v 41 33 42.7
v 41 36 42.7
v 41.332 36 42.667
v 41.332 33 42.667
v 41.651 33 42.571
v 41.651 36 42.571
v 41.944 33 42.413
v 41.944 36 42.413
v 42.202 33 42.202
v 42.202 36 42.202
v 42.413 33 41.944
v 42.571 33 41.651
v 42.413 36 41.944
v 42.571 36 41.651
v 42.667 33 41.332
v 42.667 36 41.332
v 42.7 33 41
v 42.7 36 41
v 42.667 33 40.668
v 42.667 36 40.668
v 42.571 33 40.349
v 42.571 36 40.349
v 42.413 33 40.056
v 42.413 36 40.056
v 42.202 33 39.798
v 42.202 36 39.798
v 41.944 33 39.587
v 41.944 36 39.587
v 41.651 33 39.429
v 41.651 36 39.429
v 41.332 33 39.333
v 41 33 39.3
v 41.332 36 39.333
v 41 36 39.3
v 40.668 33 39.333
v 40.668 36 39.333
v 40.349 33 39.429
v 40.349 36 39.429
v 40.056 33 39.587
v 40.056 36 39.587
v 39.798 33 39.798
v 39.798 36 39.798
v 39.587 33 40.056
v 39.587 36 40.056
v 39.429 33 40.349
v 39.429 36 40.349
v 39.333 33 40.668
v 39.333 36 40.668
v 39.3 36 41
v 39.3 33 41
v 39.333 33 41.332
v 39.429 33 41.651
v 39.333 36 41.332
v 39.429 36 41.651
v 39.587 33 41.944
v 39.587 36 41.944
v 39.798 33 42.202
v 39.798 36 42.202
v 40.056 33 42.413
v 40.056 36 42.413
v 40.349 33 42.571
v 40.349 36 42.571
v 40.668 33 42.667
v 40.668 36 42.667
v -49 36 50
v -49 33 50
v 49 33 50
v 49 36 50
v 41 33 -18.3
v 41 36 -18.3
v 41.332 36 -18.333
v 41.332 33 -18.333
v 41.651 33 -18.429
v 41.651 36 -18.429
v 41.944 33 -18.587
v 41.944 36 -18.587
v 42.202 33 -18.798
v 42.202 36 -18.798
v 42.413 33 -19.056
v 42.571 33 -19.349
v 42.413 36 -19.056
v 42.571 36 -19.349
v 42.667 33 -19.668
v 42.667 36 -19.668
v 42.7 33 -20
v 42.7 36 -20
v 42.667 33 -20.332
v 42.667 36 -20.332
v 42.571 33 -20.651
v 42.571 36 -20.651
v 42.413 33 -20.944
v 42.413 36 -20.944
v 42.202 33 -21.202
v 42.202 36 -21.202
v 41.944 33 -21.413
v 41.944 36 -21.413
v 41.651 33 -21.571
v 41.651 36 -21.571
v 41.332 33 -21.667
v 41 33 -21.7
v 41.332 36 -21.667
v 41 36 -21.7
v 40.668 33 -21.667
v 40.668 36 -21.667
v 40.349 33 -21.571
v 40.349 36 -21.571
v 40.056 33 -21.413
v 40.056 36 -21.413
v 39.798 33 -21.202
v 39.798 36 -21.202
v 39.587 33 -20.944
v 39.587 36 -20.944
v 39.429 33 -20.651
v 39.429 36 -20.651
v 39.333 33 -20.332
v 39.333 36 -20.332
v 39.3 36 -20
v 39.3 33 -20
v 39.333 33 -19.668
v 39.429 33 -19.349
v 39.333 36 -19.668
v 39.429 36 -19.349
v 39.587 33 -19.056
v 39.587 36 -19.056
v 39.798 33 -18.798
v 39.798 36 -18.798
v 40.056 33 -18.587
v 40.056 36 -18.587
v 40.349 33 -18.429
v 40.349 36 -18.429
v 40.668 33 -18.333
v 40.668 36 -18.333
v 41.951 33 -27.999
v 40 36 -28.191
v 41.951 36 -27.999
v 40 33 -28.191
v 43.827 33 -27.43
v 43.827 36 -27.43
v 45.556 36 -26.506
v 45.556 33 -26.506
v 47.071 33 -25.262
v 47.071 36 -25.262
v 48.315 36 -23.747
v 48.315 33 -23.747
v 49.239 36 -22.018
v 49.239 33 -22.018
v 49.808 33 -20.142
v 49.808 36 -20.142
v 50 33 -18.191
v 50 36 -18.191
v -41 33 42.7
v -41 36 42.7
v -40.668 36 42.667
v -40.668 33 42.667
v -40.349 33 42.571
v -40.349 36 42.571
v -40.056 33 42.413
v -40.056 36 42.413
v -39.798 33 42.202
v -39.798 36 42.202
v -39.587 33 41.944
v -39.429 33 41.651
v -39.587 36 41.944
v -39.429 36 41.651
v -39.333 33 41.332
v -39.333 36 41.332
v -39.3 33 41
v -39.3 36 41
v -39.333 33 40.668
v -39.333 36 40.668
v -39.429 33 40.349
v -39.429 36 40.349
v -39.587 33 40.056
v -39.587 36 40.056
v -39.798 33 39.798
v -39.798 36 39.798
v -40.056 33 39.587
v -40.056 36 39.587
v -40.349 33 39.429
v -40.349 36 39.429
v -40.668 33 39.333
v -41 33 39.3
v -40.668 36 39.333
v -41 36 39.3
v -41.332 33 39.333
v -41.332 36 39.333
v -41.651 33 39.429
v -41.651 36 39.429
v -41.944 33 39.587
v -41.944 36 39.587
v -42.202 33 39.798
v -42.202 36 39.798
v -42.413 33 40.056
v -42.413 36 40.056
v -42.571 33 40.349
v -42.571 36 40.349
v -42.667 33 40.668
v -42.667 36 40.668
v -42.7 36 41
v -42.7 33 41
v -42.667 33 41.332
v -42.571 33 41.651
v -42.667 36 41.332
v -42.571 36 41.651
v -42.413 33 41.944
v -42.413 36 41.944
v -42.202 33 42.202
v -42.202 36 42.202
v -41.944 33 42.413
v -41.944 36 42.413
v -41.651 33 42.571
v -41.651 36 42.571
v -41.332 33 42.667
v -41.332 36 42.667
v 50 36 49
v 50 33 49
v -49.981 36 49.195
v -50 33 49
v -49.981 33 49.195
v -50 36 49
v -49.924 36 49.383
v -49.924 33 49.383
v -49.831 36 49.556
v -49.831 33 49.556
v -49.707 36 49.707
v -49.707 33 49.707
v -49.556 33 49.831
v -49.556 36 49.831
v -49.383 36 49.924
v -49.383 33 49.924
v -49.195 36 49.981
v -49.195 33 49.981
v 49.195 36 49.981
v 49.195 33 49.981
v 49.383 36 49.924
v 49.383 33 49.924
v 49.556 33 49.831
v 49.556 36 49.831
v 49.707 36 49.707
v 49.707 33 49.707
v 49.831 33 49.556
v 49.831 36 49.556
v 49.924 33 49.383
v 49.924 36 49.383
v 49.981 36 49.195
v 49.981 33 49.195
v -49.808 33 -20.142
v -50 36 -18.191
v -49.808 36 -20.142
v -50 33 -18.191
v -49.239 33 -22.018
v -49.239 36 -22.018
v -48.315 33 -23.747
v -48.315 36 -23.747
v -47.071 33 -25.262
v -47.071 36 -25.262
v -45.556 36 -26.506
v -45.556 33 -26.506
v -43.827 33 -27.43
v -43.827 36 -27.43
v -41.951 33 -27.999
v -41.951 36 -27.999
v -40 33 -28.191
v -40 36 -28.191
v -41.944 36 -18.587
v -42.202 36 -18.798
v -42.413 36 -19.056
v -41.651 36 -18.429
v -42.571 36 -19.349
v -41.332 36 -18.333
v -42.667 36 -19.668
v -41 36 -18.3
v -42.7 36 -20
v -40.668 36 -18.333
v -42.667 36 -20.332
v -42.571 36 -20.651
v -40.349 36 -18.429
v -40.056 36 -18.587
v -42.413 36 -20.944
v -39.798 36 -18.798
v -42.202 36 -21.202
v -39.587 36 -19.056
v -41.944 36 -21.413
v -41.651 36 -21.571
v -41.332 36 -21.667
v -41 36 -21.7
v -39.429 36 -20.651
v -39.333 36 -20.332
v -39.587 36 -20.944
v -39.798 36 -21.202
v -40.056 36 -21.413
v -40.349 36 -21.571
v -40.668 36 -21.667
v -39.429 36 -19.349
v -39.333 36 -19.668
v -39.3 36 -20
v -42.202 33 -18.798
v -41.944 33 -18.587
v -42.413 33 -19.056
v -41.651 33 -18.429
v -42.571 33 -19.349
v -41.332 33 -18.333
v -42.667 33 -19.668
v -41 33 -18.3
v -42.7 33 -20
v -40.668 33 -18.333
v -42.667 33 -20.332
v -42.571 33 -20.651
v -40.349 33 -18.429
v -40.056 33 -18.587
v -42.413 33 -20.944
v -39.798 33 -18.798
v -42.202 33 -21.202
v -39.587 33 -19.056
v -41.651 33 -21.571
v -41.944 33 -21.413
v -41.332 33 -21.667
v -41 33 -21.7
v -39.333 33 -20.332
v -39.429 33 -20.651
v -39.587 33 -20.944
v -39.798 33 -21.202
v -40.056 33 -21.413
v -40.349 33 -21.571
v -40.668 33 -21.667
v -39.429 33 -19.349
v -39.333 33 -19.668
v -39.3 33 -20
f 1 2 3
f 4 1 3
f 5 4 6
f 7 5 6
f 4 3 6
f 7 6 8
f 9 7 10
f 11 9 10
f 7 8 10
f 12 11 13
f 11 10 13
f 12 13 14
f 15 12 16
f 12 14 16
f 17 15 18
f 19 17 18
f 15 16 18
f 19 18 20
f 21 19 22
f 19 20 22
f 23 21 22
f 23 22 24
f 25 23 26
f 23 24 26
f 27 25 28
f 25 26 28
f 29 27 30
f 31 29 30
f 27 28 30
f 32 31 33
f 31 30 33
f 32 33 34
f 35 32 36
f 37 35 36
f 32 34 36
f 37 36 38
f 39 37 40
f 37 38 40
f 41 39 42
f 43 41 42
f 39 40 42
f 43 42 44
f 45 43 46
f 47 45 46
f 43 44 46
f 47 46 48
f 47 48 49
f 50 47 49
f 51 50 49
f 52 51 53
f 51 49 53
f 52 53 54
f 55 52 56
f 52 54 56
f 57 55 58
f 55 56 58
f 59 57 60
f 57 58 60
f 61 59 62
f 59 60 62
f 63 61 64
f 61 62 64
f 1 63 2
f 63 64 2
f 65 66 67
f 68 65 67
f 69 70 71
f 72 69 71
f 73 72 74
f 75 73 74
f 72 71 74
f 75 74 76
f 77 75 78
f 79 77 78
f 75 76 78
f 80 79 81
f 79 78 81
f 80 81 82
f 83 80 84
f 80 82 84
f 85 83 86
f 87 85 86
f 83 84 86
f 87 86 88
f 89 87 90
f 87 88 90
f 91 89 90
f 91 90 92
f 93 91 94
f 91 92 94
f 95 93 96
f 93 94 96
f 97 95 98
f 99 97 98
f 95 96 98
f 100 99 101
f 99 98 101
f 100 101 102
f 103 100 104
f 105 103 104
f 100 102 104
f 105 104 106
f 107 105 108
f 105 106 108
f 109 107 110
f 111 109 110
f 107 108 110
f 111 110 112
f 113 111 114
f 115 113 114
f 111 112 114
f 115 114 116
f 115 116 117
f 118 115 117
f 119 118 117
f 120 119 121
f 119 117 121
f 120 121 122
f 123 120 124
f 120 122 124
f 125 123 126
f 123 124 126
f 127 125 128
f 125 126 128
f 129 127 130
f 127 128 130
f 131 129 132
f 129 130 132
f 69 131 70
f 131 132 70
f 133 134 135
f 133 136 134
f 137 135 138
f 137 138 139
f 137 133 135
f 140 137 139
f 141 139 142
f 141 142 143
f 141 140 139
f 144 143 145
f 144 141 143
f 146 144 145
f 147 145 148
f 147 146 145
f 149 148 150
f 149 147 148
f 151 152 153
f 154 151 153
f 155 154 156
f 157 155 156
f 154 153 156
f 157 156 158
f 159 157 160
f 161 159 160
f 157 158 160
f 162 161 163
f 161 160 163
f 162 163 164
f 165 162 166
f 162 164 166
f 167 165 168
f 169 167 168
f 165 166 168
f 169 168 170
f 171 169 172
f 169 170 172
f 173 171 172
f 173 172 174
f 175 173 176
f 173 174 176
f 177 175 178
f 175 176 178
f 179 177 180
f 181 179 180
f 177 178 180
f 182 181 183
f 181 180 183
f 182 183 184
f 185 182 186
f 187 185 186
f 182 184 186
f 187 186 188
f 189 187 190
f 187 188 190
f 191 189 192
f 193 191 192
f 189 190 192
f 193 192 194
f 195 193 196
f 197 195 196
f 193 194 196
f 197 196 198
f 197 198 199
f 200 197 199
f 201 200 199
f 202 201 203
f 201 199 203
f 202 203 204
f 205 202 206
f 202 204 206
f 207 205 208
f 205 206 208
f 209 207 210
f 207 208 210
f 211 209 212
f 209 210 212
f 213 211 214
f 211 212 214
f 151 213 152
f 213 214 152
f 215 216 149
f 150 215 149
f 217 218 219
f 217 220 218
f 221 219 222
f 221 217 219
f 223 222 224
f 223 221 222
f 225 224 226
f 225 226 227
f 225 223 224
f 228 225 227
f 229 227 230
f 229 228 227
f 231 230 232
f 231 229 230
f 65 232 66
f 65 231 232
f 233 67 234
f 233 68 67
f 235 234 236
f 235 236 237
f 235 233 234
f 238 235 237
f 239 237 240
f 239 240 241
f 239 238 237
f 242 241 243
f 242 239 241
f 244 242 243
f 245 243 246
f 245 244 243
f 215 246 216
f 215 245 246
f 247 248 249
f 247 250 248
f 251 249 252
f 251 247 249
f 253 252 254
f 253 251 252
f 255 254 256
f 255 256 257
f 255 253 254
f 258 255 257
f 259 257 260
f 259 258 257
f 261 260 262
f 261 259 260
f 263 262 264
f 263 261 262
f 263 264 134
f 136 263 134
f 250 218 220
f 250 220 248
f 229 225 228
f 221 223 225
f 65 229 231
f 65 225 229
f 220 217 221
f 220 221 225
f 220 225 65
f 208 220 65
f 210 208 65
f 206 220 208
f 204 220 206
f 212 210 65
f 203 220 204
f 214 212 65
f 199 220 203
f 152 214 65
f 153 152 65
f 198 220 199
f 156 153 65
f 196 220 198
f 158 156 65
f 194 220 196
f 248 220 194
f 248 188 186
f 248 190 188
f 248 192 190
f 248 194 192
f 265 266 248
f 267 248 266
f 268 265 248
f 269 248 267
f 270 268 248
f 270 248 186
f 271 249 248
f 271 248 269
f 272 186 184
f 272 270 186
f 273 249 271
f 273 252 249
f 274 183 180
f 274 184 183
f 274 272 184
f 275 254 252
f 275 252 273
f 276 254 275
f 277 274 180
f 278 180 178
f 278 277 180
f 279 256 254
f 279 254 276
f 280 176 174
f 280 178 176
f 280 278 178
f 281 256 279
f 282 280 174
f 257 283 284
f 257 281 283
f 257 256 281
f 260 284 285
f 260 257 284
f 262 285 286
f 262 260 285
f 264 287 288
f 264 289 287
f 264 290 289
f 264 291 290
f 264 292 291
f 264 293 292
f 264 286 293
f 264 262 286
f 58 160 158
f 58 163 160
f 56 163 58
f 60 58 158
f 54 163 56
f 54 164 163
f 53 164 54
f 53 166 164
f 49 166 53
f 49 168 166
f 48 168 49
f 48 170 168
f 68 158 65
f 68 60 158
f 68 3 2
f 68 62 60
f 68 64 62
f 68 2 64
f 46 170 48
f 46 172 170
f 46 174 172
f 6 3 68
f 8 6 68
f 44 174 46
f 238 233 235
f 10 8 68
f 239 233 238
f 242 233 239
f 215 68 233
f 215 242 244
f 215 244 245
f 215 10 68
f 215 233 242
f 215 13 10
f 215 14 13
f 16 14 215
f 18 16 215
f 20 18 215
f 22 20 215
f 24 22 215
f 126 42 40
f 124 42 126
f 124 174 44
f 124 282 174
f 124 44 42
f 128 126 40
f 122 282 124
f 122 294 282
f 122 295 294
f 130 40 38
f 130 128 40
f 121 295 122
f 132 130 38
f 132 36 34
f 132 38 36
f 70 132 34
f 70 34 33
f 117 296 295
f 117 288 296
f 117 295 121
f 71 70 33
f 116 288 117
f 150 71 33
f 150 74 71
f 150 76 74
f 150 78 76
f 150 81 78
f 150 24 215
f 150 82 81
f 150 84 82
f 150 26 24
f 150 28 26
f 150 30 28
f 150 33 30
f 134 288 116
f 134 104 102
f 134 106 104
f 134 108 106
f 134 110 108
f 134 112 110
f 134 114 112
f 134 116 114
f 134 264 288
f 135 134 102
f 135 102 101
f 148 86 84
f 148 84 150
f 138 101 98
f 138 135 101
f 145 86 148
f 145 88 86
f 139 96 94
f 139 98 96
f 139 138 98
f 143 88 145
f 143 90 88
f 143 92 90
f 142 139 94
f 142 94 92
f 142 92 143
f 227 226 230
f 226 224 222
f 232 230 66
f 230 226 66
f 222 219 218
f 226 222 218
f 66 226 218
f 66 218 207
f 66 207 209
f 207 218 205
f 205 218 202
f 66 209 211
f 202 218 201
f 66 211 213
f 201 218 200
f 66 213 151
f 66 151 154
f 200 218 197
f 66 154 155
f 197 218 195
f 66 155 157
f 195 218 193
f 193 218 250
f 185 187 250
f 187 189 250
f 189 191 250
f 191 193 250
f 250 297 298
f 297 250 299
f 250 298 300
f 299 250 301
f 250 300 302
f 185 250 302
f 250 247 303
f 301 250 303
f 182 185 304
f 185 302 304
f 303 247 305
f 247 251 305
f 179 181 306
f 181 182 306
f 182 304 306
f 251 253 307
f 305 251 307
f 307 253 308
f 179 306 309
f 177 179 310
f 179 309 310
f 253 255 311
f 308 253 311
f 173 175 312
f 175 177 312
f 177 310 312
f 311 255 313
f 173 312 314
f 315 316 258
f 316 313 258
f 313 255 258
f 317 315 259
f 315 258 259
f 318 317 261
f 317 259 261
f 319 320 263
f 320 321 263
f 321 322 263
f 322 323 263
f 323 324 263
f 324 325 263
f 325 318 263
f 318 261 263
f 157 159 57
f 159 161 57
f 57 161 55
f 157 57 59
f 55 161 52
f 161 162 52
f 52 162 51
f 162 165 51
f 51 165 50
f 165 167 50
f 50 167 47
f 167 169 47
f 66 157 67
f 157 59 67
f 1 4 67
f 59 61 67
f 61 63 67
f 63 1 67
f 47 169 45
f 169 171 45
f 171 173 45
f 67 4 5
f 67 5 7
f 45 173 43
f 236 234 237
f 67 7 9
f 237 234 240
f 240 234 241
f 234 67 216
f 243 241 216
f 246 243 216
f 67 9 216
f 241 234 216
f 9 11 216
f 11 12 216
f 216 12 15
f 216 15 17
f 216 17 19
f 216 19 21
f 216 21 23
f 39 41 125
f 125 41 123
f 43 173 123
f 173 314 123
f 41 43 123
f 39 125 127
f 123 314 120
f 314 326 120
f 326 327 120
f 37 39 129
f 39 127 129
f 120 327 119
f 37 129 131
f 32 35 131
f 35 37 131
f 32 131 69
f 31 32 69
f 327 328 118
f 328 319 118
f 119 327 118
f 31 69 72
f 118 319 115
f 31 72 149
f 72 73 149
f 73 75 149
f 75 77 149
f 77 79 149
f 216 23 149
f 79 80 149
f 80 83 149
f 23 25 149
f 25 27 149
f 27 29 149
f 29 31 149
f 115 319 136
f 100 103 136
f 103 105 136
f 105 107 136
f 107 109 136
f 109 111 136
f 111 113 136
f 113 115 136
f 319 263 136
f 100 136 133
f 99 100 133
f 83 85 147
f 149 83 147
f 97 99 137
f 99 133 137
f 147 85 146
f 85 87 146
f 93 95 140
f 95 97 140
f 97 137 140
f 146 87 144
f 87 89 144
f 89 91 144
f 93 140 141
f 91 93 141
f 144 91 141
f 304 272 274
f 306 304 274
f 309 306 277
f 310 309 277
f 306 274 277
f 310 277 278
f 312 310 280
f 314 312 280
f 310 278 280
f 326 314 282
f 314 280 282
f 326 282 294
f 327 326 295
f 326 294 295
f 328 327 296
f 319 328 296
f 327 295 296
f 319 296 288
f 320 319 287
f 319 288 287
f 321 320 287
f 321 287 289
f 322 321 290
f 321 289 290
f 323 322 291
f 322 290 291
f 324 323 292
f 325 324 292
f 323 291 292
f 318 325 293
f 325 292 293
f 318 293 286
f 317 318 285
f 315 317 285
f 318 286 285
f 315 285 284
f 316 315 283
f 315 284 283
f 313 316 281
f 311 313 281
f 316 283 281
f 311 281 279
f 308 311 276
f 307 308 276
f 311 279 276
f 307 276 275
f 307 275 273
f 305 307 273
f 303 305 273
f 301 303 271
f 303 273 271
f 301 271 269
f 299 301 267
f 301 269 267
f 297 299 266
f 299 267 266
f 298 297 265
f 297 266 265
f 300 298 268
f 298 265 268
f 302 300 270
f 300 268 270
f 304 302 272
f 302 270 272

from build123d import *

# Parameters (mm, degrees)
SKETCH1_W           = 100
SKETCH1_H           = 100
BOSS_EXTRUDE1_DEPTH = 3
SKETCH2_R           = 1.7
CUT_EXTRUDE1_DEPTH  = 3
SKETCH6_W           = 100
SKETCH6_H           = 21.808924231
CUT_EXTRUDE2_DEPTH  = 3
FILLET2_R           = 10
FILLET3_R           = 1


with BuildPart() as part:
    # Sketch1 → Boss-Extrude1 (new body)
    with BuildSketch(Plane(origin=(0, 33, 0), x_dir=(1, 0, 0), z_dir=(0, 1, 0))):
        Rectangle(SKETCH1_W, SKETCH1_H)
    extrude(amount=BOSS_EXTRUDE1_DEPTH)

    # Sketch2 → Cut-Extrude1 (cut)
    with BuildSketch(Plane(origin=(0, 36, 0), x_dir=(1, 0, 0), z_dir=(0, 1, 0))):
        with Locations(Location((-41, 20, 0), (0, 0, 270))):
            Circle(SKETCH2_R)
        with Locations(Location((41, 20, 0), (0, 0, 270))):
            Circle(SKETCH2_R)
        with Locations(Location((41, -41, 0), (0, 0, 270))):
            Circle(SKETCH2_R)
        with Locations(Location((-41, -41, 0), (0, 0, 270))):
            Circle(SKETCH2_R)
    extrude(amount=-CUT_EXTRUDE1_DEPTH, mode=Mode.SUBTRACT)

    # Sketch6 → Cut-Extrude2 (cut)
    with BuildSketch(Plane(origin=(0, 36, 0), x_dir=(1, 0, 0), z_dir=(0, 1, 0))):
        with Locations((0, 39.095537885)):
            Rectangle(SKETCH6_W, SKETCH6_H)
    extrude(amount=-CUT_EXTRUDE2_DEPTH, mode=Mode.SUBTRACT)

    # Fillet2
    fillet2_edges = [part.edges().sort_by_distance(p)[0] for p in [
        (-50, 34.5, -28.191075769),
        (50, 34.5, -28.191075769),
    ]]
    fillet(fillet2_edges, radius=FILLET2_R)

    # Fillet3
    fillet3_edges = [part.edges().sort_by_distance(p)[0] for p in [
        (50, 34.5, 50),
        (-50, 34.5, 50),
    ]]
    fillet(fillet3_edges, radius=FILLET3_R)


solid = part.part
